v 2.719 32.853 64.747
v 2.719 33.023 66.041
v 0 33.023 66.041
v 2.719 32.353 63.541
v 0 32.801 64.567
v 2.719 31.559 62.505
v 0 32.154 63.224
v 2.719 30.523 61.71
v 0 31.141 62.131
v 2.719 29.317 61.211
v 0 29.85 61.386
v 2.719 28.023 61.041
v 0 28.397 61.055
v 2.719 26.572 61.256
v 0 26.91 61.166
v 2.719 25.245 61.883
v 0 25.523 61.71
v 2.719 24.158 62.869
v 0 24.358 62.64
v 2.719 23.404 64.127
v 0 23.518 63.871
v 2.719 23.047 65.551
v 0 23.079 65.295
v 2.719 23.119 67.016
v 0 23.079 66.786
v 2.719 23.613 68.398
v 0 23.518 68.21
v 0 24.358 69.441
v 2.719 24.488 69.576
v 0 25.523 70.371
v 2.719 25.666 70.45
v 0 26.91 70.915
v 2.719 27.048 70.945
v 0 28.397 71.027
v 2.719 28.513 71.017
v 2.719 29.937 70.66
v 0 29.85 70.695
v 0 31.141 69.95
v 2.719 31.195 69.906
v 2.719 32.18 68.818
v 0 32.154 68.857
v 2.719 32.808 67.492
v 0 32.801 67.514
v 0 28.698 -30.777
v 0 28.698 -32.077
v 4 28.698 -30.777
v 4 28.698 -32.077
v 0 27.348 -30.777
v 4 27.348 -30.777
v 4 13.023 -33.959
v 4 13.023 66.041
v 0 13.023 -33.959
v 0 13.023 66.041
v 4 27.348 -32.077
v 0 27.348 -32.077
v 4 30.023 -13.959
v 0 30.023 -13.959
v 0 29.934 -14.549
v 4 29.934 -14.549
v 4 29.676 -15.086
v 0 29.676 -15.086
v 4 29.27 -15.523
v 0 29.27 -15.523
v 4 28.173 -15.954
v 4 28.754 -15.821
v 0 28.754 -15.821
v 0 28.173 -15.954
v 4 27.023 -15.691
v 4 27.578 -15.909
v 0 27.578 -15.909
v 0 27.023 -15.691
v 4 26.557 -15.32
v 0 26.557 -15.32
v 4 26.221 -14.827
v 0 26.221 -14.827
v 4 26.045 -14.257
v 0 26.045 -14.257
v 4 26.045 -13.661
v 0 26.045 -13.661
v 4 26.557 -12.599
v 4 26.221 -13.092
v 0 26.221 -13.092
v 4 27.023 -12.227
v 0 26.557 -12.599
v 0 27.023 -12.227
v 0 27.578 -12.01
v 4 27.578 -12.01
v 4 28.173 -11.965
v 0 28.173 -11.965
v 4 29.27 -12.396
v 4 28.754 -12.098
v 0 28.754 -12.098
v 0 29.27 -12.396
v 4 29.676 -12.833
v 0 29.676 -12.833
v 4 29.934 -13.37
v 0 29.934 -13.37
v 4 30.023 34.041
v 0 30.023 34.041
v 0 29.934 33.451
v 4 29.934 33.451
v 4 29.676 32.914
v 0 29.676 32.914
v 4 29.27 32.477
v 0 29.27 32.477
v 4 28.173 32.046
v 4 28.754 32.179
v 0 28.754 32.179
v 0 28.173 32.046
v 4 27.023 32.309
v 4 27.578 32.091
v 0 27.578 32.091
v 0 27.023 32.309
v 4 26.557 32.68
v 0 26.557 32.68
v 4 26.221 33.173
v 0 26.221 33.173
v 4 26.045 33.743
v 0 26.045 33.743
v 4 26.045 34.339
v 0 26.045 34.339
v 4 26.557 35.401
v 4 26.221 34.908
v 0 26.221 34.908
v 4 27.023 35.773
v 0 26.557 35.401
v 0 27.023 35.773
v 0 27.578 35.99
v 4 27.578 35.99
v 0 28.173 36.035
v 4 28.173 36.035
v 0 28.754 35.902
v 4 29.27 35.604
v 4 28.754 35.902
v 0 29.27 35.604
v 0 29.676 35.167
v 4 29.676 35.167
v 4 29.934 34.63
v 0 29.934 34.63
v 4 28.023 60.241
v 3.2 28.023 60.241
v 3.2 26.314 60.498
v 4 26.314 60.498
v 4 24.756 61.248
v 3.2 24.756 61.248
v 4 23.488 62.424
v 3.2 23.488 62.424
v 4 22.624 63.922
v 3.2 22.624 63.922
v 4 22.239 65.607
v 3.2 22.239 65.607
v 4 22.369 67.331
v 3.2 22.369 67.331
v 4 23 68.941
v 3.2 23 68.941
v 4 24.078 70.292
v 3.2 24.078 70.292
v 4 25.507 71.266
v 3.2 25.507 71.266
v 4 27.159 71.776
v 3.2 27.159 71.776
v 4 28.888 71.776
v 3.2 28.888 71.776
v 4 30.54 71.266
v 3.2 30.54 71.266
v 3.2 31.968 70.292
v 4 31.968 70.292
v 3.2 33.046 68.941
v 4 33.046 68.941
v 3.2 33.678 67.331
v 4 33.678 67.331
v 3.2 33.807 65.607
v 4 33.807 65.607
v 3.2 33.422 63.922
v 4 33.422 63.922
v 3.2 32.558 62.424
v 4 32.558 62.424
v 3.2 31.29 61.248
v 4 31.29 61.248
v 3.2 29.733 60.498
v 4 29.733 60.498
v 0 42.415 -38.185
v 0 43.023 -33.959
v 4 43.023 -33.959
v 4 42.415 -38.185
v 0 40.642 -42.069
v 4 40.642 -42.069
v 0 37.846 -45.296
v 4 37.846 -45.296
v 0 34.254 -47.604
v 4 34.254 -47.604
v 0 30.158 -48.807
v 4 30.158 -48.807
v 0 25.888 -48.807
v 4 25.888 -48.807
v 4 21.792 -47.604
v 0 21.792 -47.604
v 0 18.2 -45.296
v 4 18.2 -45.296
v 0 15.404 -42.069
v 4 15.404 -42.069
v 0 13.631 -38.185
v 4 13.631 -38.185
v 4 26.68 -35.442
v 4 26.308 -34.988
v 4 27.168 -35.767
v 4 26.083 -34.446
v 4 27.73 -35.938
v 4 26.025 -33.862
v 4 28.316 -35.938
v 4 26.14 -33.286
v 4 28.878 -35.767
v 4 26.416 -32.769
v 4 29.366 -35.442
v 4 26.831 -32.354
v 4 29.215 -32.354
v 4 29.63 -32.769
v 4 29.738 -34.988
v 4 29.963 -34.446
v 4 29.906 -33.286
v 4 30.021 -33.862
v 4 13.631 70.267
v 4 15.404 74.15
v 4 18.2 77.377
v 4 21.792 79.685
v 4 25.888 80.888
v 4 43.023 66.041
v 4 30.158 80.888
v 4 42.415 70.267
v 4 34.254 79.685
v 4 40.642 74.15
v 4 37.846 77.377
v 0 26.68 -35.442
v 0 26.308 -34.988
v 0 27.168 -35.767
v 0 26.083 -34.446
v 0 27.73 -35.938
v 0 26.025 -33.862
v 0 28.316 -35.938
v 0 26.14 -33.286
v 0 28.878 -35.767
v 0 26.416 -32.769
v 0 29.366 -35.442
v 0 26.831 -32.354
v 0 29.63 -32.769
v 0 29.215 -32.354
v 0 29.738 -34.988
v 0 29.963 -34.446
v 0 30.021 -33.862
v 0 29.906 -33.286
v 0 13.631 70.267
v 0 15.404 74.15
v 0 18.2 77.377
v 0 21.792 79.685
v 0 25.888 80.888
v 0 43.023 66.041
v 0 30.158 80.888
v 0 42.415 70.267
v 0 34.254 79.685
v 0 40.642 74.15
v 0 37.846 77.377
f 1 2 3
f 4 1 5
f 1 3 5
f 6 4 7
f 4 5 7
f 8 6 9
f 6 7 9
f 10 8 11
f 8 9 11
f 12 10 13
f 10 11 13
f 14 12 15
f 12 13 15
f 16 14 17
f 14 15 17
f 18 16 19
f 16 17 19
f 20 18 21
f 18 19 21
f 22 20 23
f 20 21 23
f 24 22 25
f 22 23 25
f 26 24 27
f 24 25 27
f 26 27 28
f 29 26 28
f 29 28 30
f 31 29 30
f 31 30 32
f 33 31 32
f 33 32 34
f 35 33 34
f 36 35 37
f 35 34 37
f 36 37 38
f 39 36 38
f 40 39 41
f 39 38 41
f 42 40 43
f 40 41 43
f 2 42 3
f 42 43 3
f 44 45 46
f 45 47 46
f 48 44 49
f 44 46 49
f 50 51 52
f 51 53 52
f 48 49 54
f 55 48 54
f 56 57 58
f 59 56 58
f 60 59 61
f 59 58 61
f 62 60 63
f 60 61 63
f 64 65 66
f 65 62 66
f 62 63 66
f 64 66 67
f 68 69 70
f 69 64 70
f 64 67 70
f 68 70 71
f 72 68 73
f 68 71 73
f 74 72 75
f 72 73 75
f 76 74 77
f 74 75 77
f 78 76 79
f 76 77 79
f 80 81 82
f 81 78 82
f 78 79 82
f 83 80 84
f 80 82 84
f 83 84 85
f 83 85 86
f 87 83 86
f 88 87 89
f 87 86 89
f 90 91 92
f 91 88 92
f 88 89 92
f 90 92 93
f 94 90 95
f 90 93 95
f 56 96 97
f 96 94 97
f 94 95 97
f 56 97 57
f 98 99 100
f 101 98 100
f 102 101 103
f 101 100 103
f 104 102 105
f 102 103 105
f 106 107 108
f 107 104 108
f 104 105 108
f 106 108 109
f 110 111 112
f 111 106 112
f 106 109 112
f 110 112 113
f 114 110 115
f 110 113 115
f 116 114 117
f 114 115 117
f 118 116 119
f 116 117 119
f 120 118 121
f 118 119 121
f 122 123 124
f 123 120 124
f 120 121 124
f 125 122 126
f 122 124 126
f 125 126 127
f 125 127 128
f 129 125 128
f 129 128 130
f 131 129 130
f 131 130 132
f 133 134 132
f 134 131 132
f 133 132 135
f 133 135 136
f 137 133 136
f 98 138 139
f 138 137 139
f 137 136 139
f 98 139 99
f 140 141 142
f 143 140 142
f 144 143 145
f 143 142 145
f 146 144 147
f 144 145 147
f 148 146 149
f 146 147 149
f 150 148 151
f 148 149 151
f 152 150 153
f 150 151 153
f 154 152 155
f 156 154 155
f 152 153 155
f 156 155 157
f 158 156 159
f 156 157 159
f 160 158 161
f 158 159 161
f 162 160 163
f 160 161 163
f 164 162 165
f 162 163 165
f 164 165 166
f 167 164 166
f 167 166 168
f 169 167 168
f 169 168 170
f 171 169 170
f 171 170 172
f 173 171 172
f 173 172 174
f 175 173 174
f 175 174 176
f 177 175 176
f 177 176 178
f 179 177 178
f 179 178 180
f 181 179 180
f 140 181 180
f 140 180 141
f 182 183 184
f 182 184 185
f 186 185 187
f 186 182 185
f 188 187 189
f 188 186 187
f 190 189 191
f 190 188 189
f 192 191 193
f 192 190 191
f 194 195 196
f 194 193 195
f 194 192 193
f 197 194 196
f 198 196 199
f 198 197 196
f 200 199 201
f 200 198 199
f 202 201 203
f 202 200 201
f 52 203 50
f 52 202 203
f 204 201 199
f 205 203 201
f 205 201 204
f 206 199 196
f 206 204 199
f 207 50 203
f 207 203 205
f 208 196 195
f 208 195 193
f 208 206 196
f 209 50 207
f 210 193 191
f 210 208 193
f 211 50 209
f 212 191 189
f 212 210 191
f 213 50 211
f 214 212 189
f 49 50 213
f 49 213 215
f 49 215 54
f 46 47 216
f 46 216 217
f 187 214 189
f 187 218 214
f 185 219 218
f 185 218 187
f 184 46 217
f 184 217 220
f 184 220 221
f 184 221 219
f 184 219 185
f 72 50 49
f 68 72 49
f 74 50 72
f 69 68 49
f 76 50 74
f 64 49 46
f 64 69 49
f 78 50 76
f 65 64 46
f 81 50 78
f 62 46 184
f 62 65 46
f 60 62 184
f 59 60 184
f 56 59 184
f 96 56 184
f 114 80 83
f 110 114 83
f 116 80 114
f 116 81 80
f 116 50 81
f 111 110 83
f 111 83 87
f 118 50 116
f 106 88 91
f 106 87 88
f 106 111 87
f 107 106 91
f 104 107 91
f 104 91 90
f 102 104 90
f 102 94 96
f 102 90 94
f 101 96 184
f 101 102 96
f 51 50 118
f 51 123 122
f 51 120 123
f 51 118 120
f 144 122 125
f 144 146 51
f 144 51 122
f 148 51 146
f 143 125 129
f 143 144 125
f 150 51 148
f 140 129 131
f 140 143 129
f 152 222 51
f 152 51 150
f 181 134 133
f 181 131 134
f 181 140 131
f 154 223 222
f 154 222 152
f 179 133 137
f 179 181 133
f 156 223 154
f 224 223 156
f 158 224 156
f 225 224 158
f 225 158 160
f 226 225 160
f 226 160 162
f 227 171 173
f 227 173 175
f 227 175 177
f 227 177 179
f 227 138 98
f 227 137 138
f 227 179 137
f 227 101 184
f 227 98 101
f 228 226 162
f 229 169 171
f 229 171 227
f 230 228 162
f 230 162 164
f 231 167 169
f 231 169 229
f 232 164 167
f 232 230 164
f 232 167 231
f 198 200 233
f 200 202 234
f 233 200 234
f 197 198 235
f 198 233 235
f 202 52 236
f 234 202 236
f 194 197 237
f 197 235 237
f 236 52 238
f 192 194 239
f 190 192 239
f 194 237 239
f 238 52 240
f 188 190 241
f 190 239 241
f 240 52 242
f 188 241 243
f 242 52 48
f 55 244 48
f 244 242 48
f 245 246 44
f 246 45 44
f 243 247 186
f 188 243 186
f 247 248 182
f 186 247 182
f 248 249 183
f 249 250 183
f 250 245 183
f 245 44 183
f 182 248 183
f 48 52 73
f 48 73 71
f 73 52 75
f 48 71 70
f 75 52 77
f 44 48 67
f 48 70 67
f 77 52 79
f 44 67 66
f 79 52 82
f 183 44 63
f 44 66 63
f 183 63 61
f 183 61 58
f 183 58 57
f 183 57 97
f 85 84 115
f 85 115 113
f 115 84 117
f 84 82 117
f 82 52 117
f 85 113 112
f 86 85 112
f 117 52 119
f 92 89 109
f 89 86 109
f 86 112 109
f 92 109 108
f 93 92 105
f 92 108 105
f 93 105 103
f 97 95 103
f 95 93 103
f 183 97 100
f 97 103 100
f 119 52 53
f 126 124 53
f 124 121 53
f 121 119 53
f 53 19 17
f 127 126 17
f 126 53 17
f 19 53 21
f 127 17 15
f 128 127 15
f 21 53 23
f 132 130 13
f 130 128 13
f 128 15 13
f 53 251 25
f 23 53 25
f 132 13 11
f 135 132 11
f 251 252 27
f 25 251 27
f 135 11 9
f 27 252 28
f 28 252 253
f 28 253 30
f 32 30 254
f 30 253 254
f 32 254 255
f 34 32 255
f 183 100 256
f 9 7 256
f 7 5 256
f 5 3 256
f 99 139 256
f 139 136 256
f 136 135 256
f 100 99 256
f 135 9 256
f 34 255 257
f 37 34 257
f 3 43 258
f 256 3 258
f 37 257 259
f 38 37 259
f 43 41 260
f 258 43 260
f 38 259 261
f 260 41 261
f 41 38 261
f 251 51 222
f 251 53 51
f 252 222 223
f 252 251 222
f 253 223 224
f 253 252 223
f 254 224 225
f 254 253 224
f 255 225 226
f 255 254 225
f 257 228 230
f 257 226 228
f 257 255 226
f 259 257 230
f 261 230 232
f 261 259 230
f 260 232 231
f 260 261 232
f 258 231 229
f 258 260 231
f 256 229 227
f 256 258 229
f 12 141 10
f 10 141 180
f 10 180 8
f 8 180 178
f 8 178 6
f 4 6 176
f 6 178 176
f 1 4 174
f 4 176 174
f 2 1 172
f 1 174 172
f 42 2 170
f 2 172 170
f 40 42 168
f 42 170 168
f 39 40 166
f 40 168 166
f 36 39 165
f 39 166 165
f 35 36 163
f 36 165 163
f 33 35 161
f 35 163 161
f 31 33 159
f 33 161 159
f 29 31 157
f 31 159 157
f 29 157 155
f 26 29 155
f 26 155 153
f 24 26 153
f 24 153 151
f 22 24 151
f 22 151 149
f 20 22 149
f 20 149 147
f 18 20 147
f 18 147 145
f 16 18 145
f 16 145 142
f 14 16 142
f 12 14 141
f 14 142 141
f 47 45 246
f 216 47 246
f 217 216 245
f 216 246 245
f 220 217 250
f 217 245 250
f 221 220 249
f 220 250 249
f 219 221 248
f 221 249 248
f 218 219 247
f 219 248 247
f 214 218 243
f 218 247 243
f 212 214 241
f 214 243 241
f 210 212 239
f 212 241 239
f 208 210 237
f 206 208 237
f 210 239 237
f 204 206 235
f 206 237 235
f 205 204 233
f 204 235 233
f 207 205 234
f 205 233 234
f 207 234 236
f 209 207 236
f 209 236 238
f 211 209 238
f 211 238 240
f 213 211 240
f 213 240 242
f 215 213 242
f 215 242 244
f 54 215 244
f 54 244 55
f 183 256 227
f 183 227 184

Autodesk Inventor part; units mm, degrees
ref_plane "YZ Plane" through (0, 0, 0) normal (1, 0, 0) x (0, 1, 0)
ref_plane "XZ Plane" through (0, 0, 0) normal (0, 1, 0) x (-1, 0, 0)
ref_plane "XY Plane" through (0, 0, 0) normal (0, 0, 1) x (1, 0, 0)
sketch "Sketch1" plane through (0, 0, 0) normal (1, 0, 0) x (0, 1, 0)
  arc A0 (43.0231, 66.0406) -> (13.0231, 66.0406) centre (28.0231, 66.0406) ccw
  arc A1 (13.0231, -33.9594) -> (43.0231, -33.9594) centre (28.0231, -33.9594) ccw
  line L0 (13.0231, 66.0406) -> (13.0231, -33.9594)
  line L1 (43.0231, 66.0406) -> (43.0231, -33.9594)
  circle A2 centre (28.0231, 66.0406) radius 5
  circle A3 centre (28.0231, -33.9594) radius 2
  circle A4 centre (28.0231, 34.0406) radius 2
  circle A5 centre (28.0231, -13.9594) radius 2
  point P0 (0, 0)
  dimension "d6" = 15
  dimension "d18" = 100
  dimension "d40" = 10
  dimension "d50" = 0
  dimension "d51" = 0
  dimension "d52" = 20
  dimension "d53" = 32
  dimension "d54" = 4
  dimension "d66" = 4
extrude "Extrusion6" add sketch "Sketch1" along normal blind 4
hole "Hole4" at (4, 28.0231, 66.0406) direction (-1, 0, 0) diameter 11.6 depth 0.8 tip angle 118
sketch "Sketch6" plane through (4, 0, 0) normal (1, 0, 0) x (0, 0, -1)
  circle A0 centre (33.9594, 28.0231) radius 2 projected
  line L0 (32.0767, 27.3481) -> (32.0767, 28.6981)
  line L1 (32.0767, 28.6981) -> (30.7767, 28.6981)
  line L2 (30.7767, 28.6981) -> (30.7767, 27.3481)
  line L3 (30.7767, 27.3481) -> (32.0767, 27.3481)
  point P0 (0, 0)
  dimension "d77" = 1.35
  dimension "d78" = 1.3
extrude "Extrusion7" cut sketch "Sketch6" against normal through all contours A0 L3 L2 L1
properties part number "BaseJoint"
